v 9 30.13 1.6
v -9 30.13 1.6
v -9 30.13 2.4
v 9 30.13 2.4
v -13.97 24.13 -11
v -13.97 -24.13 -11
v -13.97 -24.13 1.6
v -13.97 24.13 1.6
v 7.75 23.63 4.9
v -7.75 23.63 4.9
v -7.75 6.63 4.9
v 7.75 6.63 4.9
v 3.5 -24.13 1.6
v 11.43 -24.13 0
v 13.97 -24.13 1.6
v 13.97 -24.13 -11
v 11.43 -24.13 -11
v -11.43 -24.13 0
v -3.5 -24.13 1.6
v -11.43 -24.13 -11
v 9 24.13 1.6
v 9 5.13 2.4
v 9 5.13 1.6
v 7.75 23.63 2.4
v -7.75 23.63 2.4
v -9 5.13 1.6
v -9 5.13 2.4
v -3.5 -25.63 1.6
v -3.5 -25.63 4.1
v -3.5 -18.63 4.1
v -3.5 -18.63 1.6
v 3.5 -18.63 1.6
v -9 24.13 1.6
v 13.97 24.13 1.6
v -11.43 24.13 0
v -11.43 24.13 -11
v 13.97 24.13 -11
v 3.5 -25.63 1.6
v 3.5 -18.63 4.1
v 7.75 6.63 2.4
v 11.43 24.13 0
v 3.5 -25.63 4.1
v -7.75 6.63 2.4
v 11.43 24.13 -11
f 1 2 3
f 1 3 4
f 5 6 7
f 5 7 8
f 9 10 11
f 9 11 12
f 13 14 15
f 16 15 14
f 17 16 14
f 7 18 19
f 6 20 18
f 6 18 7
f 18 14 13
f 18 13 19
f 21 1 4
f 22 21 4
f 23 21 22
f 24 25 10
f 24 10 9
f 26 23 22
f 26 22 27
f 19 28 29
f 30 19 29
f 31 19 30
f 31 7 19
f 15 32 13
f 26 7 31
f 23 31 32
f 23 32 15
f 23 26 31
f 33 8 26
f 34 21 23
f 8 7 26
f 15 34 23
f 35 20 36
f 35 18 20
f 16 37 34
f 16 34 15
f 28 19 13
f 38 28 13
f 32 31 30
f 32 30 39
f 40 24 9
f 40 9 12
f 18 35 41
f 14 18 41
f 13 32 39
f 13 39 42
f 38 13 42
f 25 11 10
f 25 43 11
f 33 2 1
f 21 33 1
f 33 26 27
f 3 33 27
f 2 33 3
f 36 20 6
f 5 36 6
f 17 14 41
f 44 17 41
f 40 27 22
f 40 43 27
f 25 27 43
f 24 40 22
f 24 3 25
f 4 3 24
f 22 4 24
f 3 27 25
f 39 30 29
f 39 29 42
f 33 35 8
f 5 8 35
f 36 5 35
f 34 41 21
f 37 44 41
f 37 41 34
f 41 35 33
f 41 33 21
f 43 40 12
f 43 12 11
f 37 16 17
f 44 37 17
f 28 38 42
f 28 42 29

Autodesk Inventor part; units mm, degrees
ref_plane "YZ Plane" through (0, 0, 0) normal (1, 0, 0) x (0, 1, 0)
ref_plane "XZ Plane" through (0, 0, 0) normal (0, 1, 0) x (-1, 0, 0)
ref_plane "XY Plane" through (0, 0, 0) normal (0, 0, 1) x (1, 0, 0)
sketch "スケッチ1" plane through (0, 0, 0) normal (0, 0, 1) x (1, 0, 0)
  line L0 (-13.97, 24.13) -> (13.97, 24.13)
  line L1 (13.97, 24.13) -> (13.97, -24.13)
  line L2 (13.97, -24.13) -> (-13.97, -24.13)
  line L3 (-13.97, -24.13) -> (-13.97, 24.13)
  point P0 (0, 0)
  point P1 (-13.97, 0)
  point P2 (0, -24.13)
  dimension "d0" = 27.94
  dimension "d1" = 48.26
extrude "押し出し1" add sketch "スケッチ1" along normal blind 1.6
sketch "スケッチ2" plane through (0, 0, 0) normal (0, 0, -1) x (-1, 0, 0)
  line L0 (0, 28.1996) -> (0, -28.1996) construction
  line L1 (-12.7, -28.1996) -> (-12.7, 28.1996) construction
  line L2 (12.7, 28.1996) -> (12.7, -28.1996) construction
  line L3 (-11.43, 24.13) -> (-13.97, 24.13)
  line L4 (-13.97, 24.13) -> (-13.97, -24.13)
  line L5 (-13.97, -24.13) -> (-11.43, -24.13)
  line L6 (-11.43, -24.13) -> (-11.43, 24.13)
  line L7 (11.43, 24.13) -> (13.97, 24.13)
  line L8 (13.97, 24.13) -> (13.97, -24.13)
  line L9 (13.97, -24.13) -> (11.43, -24.13)
  line L10 (11.43, -24.13) -> (11.43, 24.13)
  line L11 (-13.97, -24.13) -> (-13.97, 24.13) projected
  line L12 (-13.97, 24.13) -> (13.97, 24.13) projected
  line L13 (13.97, 24.13) -> (13.97, -24.13) projected
  line L14 (13.97, -24.13) -> (-13.97, -24.13) projected
  point P0 (0, 0)
  point P1 (0, 0)
  point P2 (-12.7, 24.13)
  point P3 (12.7, 24.13)
  dimension "d4" = 25.4
  dimension "d5" = 2.54
extrude "押し出し2" add sketch "スケッチ2" along normal blind 11 contours L6 L5 L4 L3 | L7 L8 L9 L10
sketch "スケッチ3" plane through (0, 0, 1.6) normal (0, 0, 1) x (1, 0, 0)
  line L0 (-9, 30.13) -> (9, 30.13)
  line L1 (9, 30.13) -> (9, 5.13)
  line L2 (9, 5.13) -> (-9, 5.13)
  line L3 (-9, 5.13) -> (-9, 30.13)
  line L4 (13.97, 24.13) -> (-13.97, 24.13) projected
  point P0 (0, 0)
  point P1 (0, 5.13)
  dimension "d8" = 18
  dimension "d9" = 25
  dimension "d10" = 6
extrude "押し出し3" add sketch "スケッチ3" along normal blind 0.8
sketch "スケッチ4" plane through (0, 0, 2.4) normal (0, 0, 1) x (1, 0, 0)
  line L0 (-7.75, 23.63) -> (7.75, 23.63)
  line L1 (7.75, 23.63) -> (7.75, 6.63)
  line L2 (7.75, 6.63) -> (-7.75, 6.63)
  line L3 (-7.75, 6.63) -> (-7.75, 23.63)
  line L4 (-9, 5.13) -> (9, 5.13) projected
  point P0 (0, 0)
  point P1 (0, 6.63)
  dimension "d13" = 15.5
  dimension "d14" = 17
  dimension "d15" = 1.5
extrude "押し出し4" add sketch "スケッチ4" along normal blind 2.5
sketch "スケッチ5" plane through (0, 0, 1.6) normal (0, 0, 1) x (1, 0, 0)
  line L0 (-3.5, -18.63) -> (3.5, -18.63)
  line L1 (3.5, -18.63) -> (3.5, -25.63)
  line L2 (3.5, -25.63) -> (-3.5, -25.63)
  line L3 (-3.5, -25.63) -> (-3.5, -18.63)
  line L4 (-13.97, -24.13) -> (13.97, -24.13) projected
  point P0 (0, 0)
  point P1 (0, -18.63)
  dimension "d18" = 7
  dimension "d19" = 7
  dimension "d20" = 1.5
extrude "押し出し5" add sketch "スケッチ5" along normal blind 2.5
properties part number "ESP32-DevKitC"
